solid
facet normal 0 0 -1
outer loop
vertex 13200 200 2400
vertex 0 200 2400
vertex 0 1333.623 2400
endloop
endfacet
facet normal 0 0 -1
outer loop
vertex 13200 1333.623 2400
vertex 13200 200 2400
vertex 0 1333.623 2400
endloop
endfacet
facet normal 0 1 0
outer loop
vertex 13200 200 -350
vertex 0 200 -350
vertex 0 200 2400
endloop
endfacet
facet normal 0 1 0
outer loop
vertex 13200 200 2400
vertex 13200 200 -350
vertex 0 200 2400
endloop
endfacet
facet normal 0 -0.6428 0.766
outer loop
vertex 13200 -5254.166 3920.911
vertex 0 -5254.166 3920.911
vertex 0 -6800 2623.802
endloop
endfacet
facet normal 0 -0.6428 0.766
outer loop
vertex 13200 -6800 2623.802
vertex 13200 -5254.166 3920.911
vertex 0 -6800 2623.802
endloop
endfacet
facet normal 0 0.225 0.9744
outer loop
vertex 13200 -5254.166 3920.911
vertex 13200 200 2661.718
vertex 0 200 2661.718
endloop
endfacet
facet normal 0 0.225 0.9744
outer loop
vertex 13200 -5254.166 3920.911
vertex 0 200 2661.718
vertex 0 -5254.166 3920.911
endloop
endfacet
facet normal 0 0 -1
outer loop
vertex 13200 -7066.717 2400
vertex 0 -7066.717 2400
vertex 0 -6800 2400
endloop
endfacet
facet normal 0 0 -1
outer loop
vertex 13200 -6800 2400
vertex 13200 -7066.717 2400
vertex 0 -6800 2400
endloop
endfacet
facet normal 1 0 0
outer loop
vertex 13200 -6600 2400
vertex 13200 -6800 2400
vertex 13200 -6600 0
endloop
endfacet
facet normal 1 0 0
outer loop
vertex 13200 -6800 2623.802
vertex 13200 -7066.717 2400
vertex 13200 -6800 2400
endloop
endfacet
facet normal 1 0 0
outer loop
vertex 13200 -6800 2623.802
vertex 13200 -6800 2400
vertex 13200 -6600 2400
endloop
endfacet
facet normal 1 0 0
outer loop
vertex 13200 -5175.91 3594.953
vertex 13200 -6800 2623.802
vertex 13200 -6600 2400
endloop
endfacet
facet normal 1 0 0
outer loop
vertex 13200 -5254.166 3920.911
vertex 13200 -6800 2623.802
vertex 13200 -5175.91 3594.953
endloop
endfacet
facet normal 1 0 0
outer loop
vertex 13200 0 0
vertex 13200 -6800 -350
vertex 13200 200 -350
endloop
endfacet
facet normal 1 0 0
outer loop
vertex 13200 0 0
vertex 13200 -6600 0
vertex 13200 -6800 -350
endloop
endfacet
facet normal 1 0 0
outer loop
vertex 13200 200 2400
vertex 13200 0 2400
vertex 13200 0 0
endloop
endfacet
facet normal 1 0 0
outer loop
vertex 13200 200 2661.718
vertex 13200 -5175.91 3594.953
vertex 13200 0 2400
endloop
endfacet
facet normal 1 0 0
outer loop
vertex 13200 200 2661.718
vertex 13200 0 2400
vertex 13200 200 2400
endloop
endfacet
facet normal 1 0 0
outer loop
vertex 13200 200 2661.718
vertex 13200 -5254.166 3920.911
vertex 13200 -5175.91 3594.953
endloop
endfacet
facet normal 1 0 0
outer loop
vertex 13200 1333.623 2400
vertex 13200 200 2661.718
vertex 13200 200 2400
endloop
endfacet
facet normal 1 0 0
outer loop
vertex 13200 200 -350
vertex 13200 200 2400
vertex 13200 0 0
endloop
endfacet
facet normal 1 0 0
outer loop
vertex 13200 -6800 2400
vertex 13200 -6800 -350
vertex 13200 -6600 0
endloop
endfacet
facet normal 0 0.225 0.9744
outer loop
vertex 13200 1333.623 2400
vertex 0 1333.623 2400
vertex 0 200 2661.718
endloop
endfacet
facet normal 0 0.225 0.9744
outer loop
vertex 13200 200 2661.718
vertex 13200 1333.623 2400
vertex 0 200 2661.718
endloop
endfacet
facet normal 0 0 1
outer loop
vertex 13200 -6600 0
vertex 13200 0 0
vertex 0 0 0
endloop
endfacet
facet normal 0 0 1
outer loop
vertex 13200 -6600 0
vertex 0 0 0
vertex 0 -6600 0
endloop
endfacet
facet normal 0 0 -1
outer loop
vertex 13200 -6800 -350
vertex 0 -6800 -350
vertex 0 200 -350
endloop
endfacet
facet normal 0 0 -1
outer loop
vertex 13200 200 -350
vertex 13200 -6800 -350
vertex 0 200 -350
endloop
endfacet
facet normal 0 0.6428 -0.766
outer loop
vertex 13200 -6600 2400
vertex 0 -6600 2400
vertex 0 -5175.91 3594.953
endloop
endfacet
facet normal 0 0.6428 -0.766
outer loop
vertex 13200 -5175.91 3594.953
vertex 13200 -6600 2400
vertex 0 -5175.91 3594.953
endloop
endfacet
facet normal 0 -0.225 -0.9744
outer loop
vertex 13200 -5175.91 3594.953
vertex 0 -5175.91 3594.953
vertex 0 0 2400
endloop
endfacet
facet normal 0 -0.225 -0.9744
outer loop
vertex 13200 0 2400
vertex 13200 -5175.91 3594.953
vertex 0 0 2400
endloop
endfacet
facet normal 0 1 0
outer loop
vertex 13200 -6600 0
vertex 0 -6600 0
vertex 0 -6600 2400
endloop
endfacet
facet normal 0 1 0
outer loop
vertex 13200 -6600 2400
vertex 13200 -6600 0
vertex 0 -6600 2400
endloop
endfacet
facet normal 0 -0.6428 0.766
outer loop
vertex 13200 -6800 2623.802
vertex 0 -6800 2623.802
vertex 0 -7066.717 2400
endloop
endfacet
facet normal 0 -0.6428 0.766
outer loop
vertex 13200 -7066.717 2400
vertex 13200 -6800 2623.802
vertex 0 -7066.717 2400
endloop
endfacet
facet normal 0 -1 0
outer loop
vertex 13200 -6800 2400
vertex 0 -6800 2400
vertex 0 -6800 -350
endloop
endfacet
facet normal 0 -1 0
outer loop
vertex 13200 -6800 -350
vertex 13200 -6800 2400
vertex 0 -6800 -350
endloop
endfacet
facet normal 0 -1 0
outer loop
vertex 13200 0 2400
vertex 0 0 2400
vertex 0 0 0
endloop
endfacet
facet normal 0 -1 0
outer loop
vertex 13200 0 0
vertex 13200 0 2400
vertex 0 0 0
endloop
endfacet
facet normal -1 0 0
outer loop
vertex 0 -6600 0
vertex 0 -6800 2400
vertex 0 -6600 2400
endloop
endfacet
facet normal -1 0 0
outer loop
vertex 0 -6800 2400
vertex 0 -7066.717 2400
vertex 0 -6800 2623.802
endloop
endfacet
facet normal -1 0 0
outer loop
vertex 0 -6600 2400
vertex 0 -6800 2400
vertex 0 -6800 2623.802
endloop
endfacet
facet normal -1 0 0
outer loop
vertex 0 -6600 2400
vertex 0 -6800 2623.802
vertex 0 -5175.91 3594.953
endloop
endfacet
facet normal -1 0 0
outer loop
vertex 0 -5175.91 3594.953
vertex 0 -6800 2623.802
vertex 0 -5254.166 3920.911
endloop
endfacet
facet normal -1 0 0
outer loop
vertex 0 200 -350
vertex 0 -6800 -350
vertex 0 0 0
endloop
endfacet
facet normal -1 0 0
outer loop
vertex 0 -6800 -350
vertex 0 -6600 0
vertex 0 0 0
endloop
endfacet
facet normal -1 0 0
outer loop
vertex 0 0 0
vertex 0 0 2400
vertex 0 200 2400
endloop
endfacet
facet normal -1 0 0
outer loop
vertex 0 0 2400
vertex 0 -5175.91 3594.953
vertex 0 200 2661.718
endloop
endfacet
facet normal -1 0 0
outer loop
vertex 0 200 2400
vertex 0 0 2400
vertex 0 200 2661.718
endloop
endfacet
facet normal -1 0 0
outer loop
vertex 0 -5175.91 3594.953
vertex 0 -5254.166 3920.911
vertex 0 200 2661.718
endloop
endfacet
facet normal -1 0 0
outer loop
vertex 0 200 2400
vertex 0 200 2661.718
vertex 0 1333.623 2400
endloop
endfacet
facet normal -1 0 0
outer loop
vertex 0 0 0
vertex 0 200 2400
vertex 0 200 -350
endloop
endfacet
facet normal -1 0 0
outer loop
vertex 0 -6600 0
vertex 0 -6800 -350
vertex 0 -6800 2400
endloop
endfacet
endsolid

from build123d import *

# Parameters (mm, degrees)
F1_DEPTH = 13200


with BuildPart() as f1:
    # F0 (on Right) → F1 (new body)
    with BuildSketch(Plane.YZ):
        Polygon((200, -350), (200, 2400), (200, 2661.717594), (-5254.165969, 3920.911026), (-6800, 2623.802261), (-6800, 2400), (-6800, -350), align=None)
        Polygon((0, 2400), (0, 0), (-6600, 0), (-6600, 2400), (-5175.910388, 3594.953069), align=None, mode=Mode.SUBTRACT)
        Polygon((200, 2661.717594), (200, 2400), (1333.623445, 2400), align=None)
        Polygon((-6800, 2400), (-6800, 2623.802261), (-7066.717148, 2400), align=None)
    extrude(amount=F1_DEPTH)


solid = f1.part
